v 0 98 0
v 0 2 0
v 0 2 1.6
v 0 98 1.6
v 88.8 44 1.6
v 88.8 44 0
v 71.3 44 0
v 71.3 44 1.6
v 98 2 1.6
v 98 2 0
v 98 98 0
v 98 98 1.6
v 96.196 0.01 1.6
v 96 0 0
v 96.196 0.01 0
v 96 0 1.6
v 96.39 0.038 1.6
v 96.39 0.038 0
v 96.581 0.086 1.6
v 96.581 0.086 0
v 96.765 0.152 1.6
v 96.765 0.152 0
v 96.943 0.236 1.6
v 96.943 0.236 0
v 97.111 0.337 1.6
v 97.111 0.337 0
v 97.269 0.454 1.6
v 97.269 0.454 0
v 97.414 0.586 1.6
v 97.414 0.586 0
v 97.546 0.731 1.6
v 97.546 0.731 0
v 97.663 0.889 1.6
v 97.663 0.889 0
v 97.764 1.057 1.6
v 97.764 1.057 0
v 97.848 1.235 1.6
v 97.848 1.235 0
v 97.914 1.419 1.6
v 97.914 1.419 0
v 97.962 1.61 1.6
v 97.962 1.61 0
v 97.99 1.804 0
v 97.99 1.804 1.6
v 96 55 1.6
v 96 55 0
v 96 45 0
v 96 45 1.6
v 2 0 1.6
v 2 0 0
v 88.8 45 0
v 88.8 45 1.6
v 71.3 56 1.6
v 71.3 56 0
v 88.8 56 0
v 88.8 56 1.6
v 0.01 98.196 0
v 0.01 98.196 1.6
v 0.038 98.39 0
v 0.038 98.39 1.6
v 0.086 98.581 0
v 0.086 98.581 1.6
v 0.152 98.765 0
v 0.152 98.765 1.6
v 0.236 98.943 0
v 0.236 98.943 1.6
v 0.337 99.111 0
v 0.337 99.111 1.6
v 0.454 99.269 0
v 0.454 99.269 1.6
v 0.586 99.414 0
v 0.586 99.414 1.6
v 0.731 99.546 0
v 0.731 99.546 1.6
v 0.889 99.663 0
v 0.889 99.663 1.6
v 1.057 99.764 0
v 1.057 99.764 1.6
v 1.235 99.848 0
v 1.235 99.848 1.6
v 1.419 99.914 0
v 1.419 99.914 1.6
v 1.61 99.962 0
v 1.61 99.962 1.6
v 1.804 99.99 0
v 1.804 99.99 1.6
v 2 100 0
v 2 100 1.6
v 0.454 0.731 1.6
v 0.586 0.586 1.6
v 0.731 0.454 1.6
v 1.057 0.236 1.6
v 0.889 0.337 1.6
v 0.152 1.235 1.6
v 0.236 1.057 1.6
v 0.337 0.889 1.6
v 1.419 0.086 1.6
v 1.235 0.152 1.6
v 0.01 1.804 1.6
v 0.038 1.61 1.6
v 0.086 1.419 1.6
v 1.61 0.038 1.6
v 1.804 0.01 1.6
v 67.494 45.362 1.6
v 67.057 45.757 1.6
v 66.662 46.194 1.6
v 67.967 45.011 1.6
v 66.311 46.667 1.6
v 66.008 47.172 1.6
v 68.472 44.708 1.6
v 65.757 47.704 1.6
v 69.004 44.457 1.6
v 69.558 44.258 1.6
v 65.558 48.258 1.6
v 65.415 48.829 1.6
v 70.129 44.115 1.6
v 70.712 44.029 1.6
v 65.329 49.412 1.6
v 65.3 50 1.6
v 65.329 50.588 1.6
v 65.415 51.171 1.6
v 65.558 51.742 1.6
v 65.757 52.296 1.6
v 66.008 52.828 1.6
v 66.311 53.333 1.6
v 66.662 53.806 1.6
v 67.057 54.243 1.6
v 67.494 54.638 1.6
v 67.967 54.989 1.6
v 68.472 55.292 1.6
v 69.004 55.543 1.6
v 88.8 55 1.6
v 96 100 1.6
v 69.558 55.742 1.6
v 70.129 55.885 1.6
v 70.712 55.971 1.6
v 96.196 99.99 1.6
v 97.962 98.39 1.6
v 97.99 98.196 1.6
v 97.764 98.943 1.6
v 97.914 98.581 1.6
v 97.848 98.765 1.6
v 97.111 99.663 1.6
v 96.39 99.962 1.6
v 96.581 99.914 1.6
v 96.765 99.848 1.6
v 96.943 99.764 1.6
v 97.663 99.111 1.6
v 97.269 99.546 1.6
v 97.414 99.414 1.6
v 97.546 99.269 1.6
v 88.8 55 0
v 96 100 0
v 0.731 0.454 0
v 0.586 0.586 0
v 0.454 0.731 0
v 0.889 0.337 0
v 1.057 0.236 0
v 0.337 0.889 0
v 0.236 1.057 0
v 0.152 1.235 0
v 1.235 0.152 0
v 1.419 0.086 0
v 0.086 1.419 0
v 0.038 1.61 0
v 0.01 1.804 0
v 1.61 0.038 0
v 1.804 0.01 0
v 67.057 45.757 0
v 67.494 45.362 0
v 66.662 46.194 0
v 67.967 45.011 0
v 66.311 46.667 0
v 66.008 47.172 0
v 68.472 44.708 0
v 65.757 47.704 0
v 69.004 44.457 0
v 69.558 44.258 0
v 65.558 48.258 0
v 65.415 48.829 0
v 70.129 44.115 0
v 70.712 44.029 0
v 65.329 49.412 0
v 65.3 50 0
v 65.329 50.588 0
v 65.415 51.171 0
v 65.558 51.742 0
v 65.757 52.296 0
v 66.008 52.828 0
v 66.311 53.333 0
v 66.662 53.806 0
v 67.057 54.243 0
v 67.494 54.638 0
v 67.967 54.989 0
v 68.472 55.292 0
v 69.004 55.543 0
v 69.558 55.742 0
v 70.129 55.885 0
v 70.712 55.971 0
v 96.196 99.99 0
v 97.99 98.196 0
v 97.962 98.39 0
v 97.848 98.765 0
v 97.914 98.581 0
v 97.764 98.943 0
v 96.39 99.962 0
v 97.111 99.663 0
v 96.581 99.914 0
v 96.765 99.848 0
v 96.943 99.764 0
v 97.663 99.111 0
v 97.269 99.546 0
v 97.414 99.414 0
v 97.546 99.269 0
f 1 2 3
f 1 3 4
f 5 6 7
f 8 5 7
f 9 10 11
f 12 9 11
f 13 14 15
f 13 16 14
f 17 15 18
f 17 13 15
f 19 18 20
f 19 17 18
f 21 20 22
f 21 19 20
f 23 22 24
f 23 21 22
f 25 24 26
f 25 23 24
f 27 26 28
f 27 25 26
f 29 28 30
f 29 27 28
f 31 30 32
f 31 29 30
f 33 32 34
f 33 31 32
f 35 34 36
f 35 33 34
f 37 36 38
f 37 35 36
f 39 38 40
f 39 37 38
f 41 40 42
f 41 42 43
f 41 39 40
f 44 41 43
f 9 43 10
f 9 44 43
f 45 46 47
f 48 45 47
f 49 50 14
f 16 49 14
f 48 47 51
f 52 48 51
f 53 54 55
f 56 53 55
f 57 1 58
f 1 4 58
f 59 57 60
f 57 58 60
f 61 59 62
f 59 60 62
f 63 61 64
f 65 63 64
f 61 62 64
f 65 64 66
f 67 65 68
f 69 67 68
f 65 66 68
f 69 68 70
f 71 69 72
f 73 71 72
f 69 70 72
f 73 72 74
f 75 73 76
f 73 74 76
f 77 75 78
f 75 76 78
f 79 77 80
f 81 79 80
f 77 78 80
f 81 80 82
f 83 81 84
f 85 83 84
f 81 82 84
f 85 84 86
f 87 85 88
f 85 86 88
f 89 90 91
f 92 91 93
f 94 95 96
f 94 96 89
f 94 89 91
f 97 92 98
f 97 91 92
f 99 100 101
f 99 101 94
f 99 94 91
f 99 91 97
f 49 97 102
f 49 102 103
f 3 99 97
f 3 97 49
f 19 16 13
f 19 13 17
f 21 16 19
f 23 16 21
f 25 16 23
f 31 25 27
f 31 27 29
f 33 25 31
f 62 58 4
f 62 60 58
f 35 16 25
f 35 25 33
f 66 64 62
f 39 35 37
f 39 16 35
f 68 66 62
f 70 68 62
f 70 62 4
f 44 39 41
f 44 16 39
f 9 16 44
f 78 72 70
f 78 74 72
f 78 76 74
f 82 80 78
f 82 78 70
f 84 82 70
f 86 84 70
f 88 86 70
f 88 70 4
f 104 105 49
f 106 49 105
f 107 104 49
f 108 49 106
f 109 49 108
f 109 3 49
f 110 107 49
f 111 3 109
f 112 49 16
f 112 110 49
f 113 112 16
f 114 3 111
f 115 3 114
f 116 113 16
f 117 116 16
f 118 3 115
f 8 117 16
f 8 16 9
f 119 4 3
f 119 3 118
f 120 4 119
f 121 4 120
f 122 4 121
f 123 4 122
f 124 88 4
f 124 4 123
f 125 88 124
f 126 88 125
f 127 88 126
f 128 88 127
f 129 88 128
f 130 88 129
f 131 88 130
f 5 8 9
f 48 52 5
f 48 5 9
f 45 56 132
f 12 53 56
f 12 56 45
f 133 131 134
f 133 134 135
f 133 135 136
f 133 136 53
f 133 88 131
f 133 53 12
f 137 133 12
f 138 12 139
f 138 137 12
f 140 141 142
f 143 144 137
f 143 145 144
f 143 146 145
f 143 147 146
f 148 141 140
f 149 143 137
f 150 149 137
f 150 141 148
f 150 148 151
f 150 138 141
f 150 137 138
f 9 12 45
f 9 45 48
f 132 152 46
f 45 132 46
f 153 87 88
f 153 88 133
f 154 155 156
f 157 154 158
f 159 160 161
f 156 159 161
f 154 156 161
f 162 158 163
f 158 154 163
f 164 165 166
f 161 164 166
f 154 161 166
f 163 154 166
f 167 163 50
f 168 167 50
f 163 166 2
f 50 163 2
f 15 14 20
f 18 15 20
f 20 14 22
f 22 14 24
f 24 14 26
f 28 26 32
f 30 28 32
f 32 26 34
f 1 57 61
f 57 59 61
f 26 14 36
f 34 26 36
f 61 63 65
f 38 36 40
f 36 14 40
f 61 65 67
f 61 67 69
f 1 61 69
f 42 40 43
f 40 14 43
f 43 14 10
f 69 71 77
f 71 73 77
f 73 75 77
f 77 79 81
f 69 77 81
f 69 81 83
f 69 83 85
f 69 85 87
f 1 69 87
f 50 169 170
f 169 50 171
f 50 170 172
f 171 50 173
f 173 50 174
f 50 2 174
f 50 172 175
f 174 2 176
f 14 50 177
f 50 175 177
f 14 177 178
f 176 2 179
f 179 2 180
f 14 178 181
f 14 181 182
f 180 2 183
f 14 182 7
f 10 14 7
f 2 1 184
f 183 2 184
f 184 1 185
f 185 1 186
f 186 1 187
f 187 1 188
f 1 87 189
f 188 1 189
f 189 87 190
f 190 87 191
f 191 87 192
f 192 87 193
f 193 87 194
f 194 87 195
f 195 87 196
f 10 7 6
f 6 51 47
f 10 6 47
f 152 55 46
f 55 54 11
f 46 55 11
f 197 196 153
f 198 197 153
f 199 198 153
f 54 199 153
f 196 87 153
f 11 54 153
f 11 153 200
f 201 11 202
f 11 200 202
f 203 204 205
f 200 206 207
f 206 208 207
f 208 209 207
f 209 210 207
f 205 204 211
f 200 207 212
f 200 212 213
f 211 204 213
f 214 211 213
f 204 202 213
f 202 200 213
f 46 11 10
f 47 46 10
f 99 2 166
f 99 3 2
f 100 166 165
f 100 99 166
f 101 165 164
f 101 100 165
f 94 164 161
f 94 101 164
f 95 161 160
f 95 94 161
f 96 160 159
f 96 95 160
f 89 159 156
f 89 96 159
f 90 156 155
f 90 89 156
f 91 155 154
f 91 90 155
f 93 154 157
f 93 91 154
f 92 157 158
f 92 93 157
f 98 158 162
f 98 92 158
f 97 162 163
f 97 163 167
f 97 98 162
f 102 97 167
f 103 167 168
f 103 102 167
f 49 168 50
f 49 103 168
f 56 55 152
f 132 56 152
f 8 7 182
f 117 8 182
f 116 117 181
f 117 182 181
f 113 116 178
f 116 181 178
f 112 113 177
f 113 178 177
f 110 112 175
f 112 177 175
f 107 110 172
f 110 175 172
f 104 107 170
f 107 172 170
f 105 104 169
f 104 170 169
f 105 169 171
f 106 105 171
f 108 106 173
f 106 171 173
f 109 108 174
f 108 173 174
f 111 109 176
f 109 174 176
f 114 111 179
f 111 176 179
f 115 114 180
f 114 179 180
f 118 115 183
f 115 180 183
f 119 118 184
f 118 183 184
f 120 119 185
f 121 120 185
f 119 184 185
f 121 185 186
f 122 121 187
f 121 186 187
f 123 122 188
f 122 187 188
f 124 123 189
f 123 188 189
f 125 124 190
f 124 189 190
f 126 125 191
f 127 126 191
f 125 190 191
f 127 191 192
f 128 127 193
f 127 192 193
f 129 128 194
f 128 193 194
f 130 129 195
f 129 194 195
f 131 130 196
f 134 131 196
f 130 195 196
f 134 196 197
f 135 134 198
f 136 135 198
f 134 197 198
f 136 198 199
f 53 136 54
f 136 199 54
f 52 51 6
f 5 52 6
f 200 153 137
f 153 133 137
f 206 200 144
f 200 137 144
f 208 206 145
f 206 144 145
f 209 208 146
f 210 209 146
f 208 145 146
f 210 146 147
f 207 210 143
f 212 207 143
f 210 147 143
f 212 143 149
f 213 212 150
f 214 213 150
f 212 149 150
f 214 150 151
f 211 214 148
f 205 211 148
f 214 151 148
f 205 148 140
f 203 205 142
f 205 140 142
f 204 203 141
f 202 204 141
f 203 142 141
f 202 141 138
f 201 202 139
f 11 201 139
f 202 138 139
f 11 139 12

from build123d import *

# Parameters (mm, degrees)
SKETCH_1_W      = 98
SKETCH_1_H      = 100
EXTRUDE_1_DEPTH = 1.6
FILLET_1_R      = 2


with BuildPart() as part:
    # 草图1 → 凸台-拉伸1 (new body)
    with BuildSketch(Plane.XY):
        with Locations((49, 50)):
            Rectangle(SKETCH_1_W, SKETCH_1_H)
        with BuildLine():
            Line((96, 55), (96, 50))
            Line((96, 50), (96, 45))
            Line((96, 45), (88.8, 45))
            Line((88.8, 45), (88.8, 44))
            Line((88.8, 44), (71.3, 44))
            ThreePointArc((71.3, 44), (65.3, 50), (71.3, 56))
            Line((71.3, 56), (88.8, 56))
            Line((88.8, 56), (88.8, 55))
            Line((88.8, 55), (96, 55))
        make_face(mode=Mode.SUBTRACT)
    extrude(amount=EXTRUDE_1_DEPTH)

    # 圆角1
    fillet_1_edges = [part.edges().sort_by_distance(p)[0] for p in [
        (0, 0, 0.8),
        (0, 100, 0.8),
        (98, 100, 0.8),
        (98, 0, 0.8),
    ]]
    fillet(fillet_1_edges, radius=FILLET_1_R)


solid = part.part
